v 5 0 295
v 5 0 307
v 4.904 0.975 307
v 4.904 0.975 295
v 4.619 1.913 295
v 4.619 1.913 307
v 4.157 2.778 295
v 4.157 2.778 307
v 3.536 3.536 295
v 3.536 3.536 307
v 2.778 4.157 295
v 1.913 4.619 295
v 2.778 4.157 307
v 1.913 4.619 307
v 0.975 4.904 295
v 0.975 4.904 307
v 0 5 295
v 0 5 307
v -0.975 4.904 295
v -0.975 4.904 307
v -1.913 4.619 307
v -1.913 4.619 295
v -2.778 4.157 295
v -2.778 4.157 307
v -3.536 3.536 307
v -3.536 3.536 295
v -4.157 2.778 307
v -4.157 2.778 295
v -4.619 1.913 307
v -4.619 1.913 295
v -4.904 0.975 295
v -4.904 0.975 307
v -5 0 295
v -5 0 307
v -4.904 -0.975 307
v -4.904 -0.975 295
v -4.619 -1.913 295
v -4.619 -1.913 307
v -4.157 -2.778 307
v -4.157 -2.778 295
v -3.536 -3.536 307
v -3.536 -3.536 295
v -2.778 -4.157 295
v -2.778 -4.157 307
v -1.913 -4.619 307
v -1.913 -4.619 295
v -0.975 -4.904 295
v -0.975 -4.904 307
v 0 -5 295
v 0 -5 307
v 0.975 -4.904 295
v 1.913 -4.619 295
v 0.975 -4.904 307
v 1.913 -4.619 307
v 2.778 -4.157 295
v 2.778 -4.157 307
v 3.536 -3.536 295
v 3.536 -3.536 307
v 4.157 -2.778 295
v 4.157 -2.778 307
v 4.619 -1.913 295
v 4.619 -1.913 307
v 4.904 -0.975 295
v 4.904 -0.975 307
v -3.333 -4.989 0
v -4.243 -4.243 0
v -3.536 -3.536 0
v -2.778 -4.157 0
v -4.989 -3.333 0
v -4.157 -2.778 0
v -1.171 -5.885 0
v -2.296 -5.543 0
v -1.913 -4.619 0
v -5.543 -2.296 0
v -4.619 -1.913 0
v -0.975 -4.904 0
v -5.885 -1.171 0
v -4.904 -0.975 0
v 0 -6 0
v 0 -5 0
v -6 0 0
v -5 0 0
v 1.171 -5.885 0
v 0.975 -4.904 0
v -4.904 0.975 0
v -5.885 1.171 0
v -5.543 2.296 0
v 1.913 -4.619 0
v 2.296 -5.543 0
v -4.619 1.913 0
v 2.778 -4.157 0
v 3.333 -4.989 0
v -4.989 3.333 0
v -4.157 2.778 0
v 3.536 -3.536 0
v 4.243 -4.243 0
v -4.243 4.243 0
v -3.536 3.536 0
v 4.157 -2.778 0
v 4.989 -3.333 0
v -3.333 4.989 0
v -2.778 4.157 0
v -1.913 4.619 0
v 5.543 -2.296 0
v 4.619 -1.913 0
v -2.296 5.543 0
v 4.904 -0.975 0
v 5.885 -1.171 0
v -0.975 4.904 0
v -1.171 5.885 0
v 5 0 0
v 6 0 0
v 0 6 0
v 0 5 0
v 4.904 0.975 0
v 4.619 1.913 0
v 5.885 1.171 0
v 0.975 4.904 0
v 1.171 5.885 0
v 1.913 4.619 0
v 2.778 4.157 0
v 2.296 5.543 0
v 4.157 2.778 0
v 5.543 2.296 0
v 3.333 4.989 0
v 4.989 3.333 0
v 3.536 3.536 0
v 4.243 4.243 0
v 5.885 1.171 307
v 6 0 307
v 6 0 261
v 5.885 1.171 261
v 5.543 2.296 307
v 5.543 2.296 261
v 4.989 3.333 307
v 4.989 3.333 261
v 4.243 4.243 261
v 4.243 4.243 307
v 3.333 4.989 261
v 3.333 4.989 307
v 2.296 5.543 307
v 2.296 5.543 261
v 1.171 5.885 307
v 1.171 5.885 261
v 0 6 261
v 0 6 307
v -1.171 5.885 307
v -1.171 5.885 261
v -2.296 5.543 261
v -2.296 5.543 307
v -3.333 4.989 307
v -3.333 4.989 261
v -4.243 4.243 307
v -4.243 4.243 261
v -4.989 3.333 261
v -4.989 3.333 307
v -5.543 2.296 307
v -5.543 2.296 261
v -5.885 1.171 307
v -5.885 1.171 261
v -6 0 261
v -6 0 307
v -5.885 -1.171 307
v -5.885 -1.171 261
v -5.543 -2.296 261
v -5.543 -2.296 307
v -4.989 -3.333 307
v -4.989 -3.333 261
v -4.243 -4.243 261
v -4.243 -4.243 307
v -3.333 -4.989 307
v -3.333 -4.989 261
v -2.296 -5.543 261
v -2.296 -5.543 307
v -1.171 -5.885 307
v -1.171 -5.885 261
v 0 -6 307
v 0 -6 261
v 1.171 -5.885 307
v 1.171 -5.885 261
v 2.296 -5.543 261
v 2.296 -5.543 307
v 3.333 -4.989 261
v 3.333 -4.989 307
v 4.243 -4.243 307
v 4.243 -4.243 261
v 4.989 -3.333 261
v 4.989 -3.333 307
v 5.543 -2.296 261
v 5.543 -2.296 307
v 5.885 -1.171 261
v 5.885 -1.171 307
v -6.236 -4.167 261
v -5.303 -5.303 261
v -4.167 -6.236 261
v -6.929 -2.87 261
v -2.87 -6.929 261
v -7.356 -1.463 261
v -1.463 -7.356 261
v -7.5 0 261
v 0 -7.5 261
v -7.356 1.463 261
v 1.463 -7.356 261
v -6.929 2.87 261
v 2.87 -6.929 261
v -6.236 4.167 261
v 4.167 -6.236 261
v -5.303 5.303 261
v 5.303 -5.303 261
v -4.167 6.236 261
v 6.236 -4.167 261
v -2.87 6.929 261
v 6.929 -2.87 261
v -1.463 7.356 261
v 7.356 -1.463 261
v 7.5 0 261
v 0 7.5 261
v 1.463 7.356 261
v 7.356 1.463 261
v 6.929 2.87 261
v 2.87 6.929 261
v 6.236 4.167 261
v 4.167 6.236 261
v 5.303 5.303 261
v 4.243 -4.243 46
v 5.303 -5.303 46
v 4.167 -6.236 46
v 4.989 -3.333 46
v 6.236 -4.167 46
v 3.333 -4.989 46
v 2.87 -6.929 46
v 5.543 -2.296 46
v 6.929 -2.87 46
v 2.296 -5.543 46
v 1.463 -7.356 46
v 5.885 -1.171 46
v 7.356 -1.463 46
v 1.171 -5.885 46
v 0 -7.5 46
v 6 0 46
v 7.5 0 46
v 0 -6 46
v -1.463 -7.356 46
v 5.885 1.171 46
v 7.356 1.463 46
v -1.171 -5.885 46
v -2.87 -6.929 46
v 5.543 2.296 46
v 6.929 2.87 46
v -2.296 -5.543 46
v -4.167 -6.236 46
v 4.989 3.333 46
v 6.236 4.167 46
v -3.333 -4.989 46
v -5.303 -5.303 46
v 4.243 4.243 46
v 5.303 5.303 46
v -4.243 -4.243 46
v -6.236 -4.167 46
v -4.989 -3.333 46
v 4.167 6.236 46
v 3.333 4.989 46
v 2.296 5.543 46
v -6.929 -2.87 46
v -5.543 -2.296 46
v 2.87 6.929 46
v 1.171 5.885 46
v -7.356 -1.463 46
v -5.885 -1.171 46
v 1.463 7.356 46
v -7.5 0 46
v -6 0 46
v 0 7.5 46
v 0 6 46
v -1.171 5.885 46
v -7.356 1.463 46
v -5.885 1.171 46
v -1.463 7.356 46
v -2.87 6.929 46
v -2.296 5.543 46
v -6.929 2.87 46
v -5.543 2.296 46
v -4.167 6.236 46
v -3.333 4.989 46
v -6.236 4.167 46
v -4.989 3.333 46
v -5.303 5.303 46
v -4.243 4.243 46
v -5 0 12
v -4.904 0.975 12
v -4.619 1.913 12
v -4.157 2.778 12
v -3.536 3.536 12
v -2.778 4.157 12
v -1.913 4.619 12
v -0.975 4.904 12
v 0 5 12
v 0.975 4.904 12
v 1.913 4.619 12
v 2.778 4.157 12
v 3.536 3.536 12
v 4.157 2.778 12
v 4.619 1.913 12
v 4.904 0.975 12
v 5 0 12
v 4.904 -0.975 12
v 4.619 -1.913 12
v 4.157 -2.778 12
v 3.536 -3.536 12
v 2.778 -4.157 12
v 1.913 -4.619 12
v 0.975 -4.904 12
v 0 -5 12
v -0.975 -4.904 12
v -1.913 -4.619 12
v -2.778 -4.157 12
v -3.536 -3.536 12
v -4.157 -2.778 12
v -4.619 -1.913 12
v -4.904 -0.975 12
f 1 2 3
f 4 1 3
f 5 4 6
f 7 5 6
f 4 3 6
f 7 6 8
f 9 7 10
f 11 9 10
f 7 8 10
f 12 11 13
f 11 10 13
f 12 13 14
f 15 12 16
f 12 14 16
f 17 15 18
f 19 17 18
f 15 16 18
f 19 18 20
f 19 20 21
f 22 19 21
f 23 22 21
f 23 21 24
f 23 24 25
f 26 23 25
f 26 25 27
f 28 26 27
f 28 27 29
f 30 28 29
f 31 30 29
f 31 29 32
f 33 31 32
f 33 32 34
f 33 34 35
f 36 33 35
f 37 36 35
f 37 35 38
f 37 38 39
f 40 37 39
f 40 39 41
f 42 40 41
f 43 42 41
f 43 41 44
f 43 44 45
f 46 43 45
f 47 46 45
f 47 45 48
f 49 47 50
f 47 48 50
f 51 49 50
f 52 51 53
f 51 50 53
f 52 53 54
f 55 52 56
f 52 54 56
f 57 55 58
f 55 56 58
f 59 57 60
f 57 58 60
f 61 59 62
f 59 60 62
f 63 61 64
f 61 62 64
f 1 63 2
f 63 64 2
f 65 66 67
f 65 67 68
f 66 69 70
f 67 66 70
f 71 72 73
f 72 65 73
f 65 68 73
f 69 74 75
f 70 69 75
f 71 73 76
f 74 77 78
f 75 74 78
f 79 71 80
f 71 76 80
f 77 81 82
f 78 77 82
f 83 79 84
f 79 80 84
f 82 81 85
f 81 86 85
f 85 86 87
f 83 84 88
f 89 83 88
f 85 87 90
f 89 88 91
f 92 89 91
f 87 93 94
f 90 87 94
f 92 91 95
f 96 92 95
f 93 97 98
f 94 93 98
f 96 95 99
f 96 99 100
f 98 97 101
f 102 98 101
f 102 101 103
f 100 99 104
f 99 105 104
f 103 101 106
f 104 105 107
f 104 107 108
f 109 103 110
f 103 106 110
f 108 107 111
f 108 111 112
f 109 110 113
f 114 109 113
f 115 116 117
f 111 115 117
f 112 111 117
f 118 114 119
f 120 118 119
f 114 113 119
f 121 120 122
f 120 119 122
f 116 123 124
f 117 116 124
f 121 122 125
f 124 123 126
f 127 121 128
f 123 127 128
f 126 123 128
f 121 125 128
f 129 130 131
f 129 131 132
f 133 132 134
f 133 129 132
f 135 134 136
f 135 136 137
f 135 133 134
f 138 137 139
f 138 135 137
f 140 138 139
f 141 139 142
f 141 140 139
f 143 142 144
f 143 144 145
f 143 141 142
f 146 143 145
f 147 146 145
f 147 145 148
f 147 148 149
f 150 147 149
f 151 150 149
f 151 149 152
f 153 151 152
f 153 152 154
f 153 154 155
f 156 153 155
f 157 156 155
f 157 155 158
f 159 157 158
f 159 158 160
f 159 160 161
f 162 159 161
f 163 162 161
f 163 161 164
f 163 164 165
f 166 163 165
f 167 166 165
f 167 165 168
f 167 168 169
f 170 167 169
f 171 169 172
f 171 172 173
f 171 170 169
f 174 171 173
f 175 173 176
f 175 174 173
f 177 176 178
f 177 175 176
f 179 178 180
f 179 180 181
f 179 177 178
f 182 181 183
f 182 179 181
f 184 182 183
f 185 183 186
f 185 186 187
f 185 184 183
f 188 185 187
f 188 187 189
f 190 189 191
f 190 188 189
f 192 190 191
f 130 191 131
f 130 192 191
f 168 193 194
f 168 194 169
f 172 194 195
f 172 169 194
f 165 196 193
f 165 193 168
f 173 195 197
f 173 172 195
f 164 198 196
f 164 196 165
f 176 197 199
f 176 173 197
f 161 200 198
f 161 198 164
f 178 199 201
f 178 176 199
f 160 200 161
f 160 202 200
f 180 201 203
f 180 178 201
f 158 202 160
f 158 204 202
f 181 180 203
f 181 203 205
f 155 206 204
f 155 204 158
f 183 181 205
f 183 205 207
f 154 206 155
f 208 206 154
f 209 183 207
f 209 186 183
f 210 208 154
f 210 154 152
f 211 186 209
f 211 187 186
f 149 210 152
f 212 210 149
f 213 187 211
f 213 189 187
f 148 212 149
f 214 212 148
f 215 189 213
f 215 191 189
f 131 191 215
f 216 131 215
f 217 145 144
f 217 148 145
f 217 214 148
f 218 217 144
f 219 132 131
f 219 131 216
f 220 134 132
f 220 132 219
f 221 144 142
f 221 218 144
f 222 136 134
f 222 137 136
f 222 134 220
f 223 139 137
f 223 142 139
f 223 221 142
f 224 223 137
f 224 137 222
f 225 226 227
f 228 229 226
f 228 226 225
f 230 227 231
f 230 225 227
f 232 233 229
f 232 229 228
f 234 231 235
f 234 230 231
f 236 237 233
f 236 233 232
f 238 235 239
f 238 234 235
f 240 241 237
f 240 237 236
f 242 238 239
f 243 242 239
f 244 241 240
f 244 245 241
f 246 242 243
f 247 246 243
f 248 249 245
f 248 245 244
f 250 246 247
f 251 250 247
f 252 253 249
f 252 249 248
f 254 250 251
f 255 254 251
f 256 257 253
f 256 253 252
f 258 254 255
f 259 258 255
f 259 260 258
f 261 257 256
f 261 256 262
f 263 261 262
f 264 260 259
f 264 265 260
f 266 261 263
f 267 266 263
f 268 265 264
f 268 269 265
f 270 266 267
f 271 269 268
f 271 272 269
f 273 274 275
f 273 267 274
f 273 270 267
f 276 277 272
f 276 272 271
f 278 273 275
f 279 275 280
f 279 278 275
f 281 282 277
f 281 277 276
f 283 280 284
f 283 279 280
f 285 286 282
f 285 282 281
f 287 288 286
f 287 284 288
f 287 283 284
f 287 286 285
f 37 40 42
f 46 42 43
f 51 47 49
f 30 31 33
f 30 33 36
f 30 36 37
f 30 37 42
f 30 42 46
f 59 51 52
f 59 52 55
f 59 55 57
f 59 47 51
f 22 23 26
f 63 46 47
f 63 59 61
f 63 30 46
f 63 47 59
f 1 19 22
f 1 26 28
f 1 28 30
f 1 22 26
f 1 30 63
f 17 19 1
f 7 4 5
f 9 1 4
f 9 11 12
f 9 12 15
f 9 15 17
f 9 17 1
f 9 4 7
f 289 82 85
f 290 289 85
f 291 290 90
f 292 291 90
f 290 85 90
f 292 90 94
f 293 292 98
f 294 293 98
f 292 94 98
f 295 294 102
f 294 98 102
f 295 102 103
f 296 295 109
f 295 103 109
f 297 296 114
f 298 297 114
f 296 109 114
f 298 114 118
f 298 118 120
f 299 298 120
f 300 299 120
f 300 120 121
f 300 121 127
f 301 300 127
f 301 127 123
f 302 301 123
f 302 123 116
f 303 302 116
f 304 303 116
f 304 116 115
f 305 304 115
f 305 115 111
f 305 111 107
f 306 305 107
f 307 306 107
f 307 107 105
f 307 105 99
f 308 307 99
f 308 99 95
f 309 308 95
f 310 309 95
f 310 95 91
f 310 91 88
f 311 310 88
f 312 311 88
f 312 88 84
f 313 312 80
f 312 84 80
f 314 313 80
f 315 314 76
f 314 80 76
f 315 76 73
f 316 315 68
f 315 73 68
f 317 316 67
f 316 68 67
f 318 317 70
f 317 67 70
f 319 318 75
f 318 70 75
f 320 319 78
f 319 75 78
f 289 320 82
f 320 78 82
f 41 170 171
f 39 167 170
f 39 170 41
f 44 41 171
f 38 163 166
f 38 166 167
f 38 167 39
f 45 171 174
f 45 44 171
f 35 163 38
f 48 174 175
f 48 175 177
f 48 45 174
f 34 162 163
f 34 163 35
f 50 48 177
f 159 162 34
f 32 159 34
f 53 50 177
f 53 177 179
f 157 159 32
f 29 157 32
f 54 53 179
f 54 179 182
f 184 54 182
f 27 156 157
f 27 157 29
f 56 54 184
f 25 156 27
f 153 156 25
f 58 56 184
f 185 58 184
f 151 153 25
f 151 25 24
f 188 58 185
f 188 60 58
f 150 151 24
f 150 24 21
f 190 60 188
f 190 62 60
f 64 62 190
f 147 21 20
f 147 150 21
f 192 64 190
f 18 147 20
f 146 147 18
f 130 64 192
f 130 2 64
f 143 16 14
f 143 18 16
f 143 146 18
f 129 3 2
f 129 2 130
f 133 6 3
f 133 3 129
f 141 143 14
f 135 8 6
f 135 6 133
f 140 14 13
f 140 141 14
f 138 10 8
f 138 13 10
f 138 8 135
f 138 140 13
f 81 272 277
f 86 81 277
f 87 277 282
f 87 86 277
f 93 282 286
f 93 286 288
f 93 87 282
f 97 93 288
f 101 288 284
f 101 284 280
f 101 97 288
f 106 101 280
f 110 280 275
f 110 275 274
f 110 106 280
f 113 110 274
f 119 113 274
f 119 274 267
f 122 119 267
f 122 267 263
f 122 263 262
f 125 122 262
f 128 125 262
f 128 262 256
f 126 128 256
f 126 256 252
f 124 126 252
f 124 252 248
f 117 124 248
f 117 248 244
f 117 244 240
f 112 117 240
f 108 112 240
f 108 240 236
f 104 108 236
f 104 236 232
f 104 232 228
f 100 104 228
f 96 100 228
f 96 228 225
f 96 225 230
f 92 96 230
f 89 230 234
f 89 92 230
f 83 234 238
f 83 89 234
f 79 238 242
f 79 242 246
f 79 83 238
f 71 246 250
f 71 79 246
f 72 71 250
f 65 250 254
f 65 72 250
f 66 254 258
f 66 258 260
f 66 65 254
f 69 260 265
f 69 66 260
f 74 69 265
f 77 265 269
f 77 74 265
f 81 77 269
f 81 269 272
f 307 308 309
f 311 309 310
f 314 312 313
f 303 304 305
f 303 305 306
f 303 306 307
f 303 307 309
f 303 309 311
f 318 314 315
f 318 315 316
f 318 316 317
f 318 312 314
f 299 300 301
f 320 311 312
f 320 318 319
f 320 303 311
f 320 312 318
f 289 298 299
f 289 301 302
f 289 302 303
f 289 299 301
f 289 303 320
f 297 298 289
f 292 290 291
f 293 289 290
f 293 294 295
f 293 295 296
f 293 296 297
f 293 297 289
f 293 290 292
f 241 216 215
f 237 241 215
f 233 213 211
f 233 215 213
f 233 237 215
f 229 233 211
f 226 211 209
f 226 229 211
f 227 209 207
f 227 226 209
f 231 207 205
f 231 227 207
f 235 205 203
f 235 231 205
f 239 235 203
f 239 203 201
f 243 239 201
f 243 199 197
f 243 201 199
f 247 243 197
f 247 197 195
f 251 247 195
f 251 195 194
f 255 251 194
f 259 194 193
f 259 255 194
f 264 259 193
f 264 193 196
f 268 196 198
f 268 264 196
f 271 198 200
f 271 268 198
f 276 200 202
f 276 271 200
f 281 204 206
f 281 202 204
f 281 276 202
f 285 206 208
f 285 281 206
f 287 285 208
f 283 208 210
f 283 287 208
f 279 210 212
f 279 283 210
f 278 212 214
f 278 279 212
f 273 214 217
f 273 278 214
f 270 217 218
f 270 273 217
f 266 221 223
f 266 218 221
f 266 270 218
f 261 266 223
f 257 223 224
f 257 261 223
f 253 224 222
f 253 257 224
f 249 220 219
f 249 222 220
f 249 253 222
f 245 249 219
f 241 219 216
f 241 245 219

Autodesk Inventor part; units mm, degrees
ref_plane "YZ Plane" through (0, 0, 0) normal (1, 0, 0) x (0, 1, 0)
ref_plane "XZ Plane" through (0, 0, 0) normal (0, 1, 0) x (-1, 0, 0)
ref_plane "XY Plane" through (0, 0, 0) normal (0, 0, 1) x (1, 0, 0)
sketch "Sketch1" plane through (0, 0, 0) normal (0, 0, 1) x (1, 0, 0)
  circle A0 centre (0, 0) radius 7.5
  dimension "d0" = 15
extrude "Extrusion1" add sketch "Sketch1" along normal blind 307
sketch "Sketch2" plane through (0, 0, 307) normal (0, 0, 1) x (1, 0, 0)
  circle A0 centre (0, 0) radius 6
  circle A1 centre (0, 0) radius 7.5
  dimension "d3" = 12
extrude "Extrusion2" cut sketch "Sketch2" against normal blind 46
sketch "Sketch3" plane through (0, 0, 307) normal (0, 0, 1) x (1, 0, 0)
  circle A0 centre (0, 0) radius 5
  dimension "d6" = 10
extrude "Extrusion3" cut sketch "Sketch3" against normal blind 12
sketch "Sketch4" plane through (0, 0, 0) normal (0, 0, -1) x (-1, 0, 0)
  circle A0 centre (0, 0) radius 5
  circle A1 centre (0, 0) radius 7.5
  circle A2 centre (0, 0) radius 6 projected
  circle A3 centre (0, 0) radius 5
  dimension "d9" = 15
extrude "Extrusion4" cut sketch "Sketch4" against normal blind 46 contours A1
sketch "Sketch5" plane through (0, 0, 0) normal (0, 0, -1) x (-1, 0, 0)
  circle A0 centre (0, 0) radius 5
  dimension "d12" = 10
extrude "Extrusion5" cut sketch "Sketch5" against normal blind 12
